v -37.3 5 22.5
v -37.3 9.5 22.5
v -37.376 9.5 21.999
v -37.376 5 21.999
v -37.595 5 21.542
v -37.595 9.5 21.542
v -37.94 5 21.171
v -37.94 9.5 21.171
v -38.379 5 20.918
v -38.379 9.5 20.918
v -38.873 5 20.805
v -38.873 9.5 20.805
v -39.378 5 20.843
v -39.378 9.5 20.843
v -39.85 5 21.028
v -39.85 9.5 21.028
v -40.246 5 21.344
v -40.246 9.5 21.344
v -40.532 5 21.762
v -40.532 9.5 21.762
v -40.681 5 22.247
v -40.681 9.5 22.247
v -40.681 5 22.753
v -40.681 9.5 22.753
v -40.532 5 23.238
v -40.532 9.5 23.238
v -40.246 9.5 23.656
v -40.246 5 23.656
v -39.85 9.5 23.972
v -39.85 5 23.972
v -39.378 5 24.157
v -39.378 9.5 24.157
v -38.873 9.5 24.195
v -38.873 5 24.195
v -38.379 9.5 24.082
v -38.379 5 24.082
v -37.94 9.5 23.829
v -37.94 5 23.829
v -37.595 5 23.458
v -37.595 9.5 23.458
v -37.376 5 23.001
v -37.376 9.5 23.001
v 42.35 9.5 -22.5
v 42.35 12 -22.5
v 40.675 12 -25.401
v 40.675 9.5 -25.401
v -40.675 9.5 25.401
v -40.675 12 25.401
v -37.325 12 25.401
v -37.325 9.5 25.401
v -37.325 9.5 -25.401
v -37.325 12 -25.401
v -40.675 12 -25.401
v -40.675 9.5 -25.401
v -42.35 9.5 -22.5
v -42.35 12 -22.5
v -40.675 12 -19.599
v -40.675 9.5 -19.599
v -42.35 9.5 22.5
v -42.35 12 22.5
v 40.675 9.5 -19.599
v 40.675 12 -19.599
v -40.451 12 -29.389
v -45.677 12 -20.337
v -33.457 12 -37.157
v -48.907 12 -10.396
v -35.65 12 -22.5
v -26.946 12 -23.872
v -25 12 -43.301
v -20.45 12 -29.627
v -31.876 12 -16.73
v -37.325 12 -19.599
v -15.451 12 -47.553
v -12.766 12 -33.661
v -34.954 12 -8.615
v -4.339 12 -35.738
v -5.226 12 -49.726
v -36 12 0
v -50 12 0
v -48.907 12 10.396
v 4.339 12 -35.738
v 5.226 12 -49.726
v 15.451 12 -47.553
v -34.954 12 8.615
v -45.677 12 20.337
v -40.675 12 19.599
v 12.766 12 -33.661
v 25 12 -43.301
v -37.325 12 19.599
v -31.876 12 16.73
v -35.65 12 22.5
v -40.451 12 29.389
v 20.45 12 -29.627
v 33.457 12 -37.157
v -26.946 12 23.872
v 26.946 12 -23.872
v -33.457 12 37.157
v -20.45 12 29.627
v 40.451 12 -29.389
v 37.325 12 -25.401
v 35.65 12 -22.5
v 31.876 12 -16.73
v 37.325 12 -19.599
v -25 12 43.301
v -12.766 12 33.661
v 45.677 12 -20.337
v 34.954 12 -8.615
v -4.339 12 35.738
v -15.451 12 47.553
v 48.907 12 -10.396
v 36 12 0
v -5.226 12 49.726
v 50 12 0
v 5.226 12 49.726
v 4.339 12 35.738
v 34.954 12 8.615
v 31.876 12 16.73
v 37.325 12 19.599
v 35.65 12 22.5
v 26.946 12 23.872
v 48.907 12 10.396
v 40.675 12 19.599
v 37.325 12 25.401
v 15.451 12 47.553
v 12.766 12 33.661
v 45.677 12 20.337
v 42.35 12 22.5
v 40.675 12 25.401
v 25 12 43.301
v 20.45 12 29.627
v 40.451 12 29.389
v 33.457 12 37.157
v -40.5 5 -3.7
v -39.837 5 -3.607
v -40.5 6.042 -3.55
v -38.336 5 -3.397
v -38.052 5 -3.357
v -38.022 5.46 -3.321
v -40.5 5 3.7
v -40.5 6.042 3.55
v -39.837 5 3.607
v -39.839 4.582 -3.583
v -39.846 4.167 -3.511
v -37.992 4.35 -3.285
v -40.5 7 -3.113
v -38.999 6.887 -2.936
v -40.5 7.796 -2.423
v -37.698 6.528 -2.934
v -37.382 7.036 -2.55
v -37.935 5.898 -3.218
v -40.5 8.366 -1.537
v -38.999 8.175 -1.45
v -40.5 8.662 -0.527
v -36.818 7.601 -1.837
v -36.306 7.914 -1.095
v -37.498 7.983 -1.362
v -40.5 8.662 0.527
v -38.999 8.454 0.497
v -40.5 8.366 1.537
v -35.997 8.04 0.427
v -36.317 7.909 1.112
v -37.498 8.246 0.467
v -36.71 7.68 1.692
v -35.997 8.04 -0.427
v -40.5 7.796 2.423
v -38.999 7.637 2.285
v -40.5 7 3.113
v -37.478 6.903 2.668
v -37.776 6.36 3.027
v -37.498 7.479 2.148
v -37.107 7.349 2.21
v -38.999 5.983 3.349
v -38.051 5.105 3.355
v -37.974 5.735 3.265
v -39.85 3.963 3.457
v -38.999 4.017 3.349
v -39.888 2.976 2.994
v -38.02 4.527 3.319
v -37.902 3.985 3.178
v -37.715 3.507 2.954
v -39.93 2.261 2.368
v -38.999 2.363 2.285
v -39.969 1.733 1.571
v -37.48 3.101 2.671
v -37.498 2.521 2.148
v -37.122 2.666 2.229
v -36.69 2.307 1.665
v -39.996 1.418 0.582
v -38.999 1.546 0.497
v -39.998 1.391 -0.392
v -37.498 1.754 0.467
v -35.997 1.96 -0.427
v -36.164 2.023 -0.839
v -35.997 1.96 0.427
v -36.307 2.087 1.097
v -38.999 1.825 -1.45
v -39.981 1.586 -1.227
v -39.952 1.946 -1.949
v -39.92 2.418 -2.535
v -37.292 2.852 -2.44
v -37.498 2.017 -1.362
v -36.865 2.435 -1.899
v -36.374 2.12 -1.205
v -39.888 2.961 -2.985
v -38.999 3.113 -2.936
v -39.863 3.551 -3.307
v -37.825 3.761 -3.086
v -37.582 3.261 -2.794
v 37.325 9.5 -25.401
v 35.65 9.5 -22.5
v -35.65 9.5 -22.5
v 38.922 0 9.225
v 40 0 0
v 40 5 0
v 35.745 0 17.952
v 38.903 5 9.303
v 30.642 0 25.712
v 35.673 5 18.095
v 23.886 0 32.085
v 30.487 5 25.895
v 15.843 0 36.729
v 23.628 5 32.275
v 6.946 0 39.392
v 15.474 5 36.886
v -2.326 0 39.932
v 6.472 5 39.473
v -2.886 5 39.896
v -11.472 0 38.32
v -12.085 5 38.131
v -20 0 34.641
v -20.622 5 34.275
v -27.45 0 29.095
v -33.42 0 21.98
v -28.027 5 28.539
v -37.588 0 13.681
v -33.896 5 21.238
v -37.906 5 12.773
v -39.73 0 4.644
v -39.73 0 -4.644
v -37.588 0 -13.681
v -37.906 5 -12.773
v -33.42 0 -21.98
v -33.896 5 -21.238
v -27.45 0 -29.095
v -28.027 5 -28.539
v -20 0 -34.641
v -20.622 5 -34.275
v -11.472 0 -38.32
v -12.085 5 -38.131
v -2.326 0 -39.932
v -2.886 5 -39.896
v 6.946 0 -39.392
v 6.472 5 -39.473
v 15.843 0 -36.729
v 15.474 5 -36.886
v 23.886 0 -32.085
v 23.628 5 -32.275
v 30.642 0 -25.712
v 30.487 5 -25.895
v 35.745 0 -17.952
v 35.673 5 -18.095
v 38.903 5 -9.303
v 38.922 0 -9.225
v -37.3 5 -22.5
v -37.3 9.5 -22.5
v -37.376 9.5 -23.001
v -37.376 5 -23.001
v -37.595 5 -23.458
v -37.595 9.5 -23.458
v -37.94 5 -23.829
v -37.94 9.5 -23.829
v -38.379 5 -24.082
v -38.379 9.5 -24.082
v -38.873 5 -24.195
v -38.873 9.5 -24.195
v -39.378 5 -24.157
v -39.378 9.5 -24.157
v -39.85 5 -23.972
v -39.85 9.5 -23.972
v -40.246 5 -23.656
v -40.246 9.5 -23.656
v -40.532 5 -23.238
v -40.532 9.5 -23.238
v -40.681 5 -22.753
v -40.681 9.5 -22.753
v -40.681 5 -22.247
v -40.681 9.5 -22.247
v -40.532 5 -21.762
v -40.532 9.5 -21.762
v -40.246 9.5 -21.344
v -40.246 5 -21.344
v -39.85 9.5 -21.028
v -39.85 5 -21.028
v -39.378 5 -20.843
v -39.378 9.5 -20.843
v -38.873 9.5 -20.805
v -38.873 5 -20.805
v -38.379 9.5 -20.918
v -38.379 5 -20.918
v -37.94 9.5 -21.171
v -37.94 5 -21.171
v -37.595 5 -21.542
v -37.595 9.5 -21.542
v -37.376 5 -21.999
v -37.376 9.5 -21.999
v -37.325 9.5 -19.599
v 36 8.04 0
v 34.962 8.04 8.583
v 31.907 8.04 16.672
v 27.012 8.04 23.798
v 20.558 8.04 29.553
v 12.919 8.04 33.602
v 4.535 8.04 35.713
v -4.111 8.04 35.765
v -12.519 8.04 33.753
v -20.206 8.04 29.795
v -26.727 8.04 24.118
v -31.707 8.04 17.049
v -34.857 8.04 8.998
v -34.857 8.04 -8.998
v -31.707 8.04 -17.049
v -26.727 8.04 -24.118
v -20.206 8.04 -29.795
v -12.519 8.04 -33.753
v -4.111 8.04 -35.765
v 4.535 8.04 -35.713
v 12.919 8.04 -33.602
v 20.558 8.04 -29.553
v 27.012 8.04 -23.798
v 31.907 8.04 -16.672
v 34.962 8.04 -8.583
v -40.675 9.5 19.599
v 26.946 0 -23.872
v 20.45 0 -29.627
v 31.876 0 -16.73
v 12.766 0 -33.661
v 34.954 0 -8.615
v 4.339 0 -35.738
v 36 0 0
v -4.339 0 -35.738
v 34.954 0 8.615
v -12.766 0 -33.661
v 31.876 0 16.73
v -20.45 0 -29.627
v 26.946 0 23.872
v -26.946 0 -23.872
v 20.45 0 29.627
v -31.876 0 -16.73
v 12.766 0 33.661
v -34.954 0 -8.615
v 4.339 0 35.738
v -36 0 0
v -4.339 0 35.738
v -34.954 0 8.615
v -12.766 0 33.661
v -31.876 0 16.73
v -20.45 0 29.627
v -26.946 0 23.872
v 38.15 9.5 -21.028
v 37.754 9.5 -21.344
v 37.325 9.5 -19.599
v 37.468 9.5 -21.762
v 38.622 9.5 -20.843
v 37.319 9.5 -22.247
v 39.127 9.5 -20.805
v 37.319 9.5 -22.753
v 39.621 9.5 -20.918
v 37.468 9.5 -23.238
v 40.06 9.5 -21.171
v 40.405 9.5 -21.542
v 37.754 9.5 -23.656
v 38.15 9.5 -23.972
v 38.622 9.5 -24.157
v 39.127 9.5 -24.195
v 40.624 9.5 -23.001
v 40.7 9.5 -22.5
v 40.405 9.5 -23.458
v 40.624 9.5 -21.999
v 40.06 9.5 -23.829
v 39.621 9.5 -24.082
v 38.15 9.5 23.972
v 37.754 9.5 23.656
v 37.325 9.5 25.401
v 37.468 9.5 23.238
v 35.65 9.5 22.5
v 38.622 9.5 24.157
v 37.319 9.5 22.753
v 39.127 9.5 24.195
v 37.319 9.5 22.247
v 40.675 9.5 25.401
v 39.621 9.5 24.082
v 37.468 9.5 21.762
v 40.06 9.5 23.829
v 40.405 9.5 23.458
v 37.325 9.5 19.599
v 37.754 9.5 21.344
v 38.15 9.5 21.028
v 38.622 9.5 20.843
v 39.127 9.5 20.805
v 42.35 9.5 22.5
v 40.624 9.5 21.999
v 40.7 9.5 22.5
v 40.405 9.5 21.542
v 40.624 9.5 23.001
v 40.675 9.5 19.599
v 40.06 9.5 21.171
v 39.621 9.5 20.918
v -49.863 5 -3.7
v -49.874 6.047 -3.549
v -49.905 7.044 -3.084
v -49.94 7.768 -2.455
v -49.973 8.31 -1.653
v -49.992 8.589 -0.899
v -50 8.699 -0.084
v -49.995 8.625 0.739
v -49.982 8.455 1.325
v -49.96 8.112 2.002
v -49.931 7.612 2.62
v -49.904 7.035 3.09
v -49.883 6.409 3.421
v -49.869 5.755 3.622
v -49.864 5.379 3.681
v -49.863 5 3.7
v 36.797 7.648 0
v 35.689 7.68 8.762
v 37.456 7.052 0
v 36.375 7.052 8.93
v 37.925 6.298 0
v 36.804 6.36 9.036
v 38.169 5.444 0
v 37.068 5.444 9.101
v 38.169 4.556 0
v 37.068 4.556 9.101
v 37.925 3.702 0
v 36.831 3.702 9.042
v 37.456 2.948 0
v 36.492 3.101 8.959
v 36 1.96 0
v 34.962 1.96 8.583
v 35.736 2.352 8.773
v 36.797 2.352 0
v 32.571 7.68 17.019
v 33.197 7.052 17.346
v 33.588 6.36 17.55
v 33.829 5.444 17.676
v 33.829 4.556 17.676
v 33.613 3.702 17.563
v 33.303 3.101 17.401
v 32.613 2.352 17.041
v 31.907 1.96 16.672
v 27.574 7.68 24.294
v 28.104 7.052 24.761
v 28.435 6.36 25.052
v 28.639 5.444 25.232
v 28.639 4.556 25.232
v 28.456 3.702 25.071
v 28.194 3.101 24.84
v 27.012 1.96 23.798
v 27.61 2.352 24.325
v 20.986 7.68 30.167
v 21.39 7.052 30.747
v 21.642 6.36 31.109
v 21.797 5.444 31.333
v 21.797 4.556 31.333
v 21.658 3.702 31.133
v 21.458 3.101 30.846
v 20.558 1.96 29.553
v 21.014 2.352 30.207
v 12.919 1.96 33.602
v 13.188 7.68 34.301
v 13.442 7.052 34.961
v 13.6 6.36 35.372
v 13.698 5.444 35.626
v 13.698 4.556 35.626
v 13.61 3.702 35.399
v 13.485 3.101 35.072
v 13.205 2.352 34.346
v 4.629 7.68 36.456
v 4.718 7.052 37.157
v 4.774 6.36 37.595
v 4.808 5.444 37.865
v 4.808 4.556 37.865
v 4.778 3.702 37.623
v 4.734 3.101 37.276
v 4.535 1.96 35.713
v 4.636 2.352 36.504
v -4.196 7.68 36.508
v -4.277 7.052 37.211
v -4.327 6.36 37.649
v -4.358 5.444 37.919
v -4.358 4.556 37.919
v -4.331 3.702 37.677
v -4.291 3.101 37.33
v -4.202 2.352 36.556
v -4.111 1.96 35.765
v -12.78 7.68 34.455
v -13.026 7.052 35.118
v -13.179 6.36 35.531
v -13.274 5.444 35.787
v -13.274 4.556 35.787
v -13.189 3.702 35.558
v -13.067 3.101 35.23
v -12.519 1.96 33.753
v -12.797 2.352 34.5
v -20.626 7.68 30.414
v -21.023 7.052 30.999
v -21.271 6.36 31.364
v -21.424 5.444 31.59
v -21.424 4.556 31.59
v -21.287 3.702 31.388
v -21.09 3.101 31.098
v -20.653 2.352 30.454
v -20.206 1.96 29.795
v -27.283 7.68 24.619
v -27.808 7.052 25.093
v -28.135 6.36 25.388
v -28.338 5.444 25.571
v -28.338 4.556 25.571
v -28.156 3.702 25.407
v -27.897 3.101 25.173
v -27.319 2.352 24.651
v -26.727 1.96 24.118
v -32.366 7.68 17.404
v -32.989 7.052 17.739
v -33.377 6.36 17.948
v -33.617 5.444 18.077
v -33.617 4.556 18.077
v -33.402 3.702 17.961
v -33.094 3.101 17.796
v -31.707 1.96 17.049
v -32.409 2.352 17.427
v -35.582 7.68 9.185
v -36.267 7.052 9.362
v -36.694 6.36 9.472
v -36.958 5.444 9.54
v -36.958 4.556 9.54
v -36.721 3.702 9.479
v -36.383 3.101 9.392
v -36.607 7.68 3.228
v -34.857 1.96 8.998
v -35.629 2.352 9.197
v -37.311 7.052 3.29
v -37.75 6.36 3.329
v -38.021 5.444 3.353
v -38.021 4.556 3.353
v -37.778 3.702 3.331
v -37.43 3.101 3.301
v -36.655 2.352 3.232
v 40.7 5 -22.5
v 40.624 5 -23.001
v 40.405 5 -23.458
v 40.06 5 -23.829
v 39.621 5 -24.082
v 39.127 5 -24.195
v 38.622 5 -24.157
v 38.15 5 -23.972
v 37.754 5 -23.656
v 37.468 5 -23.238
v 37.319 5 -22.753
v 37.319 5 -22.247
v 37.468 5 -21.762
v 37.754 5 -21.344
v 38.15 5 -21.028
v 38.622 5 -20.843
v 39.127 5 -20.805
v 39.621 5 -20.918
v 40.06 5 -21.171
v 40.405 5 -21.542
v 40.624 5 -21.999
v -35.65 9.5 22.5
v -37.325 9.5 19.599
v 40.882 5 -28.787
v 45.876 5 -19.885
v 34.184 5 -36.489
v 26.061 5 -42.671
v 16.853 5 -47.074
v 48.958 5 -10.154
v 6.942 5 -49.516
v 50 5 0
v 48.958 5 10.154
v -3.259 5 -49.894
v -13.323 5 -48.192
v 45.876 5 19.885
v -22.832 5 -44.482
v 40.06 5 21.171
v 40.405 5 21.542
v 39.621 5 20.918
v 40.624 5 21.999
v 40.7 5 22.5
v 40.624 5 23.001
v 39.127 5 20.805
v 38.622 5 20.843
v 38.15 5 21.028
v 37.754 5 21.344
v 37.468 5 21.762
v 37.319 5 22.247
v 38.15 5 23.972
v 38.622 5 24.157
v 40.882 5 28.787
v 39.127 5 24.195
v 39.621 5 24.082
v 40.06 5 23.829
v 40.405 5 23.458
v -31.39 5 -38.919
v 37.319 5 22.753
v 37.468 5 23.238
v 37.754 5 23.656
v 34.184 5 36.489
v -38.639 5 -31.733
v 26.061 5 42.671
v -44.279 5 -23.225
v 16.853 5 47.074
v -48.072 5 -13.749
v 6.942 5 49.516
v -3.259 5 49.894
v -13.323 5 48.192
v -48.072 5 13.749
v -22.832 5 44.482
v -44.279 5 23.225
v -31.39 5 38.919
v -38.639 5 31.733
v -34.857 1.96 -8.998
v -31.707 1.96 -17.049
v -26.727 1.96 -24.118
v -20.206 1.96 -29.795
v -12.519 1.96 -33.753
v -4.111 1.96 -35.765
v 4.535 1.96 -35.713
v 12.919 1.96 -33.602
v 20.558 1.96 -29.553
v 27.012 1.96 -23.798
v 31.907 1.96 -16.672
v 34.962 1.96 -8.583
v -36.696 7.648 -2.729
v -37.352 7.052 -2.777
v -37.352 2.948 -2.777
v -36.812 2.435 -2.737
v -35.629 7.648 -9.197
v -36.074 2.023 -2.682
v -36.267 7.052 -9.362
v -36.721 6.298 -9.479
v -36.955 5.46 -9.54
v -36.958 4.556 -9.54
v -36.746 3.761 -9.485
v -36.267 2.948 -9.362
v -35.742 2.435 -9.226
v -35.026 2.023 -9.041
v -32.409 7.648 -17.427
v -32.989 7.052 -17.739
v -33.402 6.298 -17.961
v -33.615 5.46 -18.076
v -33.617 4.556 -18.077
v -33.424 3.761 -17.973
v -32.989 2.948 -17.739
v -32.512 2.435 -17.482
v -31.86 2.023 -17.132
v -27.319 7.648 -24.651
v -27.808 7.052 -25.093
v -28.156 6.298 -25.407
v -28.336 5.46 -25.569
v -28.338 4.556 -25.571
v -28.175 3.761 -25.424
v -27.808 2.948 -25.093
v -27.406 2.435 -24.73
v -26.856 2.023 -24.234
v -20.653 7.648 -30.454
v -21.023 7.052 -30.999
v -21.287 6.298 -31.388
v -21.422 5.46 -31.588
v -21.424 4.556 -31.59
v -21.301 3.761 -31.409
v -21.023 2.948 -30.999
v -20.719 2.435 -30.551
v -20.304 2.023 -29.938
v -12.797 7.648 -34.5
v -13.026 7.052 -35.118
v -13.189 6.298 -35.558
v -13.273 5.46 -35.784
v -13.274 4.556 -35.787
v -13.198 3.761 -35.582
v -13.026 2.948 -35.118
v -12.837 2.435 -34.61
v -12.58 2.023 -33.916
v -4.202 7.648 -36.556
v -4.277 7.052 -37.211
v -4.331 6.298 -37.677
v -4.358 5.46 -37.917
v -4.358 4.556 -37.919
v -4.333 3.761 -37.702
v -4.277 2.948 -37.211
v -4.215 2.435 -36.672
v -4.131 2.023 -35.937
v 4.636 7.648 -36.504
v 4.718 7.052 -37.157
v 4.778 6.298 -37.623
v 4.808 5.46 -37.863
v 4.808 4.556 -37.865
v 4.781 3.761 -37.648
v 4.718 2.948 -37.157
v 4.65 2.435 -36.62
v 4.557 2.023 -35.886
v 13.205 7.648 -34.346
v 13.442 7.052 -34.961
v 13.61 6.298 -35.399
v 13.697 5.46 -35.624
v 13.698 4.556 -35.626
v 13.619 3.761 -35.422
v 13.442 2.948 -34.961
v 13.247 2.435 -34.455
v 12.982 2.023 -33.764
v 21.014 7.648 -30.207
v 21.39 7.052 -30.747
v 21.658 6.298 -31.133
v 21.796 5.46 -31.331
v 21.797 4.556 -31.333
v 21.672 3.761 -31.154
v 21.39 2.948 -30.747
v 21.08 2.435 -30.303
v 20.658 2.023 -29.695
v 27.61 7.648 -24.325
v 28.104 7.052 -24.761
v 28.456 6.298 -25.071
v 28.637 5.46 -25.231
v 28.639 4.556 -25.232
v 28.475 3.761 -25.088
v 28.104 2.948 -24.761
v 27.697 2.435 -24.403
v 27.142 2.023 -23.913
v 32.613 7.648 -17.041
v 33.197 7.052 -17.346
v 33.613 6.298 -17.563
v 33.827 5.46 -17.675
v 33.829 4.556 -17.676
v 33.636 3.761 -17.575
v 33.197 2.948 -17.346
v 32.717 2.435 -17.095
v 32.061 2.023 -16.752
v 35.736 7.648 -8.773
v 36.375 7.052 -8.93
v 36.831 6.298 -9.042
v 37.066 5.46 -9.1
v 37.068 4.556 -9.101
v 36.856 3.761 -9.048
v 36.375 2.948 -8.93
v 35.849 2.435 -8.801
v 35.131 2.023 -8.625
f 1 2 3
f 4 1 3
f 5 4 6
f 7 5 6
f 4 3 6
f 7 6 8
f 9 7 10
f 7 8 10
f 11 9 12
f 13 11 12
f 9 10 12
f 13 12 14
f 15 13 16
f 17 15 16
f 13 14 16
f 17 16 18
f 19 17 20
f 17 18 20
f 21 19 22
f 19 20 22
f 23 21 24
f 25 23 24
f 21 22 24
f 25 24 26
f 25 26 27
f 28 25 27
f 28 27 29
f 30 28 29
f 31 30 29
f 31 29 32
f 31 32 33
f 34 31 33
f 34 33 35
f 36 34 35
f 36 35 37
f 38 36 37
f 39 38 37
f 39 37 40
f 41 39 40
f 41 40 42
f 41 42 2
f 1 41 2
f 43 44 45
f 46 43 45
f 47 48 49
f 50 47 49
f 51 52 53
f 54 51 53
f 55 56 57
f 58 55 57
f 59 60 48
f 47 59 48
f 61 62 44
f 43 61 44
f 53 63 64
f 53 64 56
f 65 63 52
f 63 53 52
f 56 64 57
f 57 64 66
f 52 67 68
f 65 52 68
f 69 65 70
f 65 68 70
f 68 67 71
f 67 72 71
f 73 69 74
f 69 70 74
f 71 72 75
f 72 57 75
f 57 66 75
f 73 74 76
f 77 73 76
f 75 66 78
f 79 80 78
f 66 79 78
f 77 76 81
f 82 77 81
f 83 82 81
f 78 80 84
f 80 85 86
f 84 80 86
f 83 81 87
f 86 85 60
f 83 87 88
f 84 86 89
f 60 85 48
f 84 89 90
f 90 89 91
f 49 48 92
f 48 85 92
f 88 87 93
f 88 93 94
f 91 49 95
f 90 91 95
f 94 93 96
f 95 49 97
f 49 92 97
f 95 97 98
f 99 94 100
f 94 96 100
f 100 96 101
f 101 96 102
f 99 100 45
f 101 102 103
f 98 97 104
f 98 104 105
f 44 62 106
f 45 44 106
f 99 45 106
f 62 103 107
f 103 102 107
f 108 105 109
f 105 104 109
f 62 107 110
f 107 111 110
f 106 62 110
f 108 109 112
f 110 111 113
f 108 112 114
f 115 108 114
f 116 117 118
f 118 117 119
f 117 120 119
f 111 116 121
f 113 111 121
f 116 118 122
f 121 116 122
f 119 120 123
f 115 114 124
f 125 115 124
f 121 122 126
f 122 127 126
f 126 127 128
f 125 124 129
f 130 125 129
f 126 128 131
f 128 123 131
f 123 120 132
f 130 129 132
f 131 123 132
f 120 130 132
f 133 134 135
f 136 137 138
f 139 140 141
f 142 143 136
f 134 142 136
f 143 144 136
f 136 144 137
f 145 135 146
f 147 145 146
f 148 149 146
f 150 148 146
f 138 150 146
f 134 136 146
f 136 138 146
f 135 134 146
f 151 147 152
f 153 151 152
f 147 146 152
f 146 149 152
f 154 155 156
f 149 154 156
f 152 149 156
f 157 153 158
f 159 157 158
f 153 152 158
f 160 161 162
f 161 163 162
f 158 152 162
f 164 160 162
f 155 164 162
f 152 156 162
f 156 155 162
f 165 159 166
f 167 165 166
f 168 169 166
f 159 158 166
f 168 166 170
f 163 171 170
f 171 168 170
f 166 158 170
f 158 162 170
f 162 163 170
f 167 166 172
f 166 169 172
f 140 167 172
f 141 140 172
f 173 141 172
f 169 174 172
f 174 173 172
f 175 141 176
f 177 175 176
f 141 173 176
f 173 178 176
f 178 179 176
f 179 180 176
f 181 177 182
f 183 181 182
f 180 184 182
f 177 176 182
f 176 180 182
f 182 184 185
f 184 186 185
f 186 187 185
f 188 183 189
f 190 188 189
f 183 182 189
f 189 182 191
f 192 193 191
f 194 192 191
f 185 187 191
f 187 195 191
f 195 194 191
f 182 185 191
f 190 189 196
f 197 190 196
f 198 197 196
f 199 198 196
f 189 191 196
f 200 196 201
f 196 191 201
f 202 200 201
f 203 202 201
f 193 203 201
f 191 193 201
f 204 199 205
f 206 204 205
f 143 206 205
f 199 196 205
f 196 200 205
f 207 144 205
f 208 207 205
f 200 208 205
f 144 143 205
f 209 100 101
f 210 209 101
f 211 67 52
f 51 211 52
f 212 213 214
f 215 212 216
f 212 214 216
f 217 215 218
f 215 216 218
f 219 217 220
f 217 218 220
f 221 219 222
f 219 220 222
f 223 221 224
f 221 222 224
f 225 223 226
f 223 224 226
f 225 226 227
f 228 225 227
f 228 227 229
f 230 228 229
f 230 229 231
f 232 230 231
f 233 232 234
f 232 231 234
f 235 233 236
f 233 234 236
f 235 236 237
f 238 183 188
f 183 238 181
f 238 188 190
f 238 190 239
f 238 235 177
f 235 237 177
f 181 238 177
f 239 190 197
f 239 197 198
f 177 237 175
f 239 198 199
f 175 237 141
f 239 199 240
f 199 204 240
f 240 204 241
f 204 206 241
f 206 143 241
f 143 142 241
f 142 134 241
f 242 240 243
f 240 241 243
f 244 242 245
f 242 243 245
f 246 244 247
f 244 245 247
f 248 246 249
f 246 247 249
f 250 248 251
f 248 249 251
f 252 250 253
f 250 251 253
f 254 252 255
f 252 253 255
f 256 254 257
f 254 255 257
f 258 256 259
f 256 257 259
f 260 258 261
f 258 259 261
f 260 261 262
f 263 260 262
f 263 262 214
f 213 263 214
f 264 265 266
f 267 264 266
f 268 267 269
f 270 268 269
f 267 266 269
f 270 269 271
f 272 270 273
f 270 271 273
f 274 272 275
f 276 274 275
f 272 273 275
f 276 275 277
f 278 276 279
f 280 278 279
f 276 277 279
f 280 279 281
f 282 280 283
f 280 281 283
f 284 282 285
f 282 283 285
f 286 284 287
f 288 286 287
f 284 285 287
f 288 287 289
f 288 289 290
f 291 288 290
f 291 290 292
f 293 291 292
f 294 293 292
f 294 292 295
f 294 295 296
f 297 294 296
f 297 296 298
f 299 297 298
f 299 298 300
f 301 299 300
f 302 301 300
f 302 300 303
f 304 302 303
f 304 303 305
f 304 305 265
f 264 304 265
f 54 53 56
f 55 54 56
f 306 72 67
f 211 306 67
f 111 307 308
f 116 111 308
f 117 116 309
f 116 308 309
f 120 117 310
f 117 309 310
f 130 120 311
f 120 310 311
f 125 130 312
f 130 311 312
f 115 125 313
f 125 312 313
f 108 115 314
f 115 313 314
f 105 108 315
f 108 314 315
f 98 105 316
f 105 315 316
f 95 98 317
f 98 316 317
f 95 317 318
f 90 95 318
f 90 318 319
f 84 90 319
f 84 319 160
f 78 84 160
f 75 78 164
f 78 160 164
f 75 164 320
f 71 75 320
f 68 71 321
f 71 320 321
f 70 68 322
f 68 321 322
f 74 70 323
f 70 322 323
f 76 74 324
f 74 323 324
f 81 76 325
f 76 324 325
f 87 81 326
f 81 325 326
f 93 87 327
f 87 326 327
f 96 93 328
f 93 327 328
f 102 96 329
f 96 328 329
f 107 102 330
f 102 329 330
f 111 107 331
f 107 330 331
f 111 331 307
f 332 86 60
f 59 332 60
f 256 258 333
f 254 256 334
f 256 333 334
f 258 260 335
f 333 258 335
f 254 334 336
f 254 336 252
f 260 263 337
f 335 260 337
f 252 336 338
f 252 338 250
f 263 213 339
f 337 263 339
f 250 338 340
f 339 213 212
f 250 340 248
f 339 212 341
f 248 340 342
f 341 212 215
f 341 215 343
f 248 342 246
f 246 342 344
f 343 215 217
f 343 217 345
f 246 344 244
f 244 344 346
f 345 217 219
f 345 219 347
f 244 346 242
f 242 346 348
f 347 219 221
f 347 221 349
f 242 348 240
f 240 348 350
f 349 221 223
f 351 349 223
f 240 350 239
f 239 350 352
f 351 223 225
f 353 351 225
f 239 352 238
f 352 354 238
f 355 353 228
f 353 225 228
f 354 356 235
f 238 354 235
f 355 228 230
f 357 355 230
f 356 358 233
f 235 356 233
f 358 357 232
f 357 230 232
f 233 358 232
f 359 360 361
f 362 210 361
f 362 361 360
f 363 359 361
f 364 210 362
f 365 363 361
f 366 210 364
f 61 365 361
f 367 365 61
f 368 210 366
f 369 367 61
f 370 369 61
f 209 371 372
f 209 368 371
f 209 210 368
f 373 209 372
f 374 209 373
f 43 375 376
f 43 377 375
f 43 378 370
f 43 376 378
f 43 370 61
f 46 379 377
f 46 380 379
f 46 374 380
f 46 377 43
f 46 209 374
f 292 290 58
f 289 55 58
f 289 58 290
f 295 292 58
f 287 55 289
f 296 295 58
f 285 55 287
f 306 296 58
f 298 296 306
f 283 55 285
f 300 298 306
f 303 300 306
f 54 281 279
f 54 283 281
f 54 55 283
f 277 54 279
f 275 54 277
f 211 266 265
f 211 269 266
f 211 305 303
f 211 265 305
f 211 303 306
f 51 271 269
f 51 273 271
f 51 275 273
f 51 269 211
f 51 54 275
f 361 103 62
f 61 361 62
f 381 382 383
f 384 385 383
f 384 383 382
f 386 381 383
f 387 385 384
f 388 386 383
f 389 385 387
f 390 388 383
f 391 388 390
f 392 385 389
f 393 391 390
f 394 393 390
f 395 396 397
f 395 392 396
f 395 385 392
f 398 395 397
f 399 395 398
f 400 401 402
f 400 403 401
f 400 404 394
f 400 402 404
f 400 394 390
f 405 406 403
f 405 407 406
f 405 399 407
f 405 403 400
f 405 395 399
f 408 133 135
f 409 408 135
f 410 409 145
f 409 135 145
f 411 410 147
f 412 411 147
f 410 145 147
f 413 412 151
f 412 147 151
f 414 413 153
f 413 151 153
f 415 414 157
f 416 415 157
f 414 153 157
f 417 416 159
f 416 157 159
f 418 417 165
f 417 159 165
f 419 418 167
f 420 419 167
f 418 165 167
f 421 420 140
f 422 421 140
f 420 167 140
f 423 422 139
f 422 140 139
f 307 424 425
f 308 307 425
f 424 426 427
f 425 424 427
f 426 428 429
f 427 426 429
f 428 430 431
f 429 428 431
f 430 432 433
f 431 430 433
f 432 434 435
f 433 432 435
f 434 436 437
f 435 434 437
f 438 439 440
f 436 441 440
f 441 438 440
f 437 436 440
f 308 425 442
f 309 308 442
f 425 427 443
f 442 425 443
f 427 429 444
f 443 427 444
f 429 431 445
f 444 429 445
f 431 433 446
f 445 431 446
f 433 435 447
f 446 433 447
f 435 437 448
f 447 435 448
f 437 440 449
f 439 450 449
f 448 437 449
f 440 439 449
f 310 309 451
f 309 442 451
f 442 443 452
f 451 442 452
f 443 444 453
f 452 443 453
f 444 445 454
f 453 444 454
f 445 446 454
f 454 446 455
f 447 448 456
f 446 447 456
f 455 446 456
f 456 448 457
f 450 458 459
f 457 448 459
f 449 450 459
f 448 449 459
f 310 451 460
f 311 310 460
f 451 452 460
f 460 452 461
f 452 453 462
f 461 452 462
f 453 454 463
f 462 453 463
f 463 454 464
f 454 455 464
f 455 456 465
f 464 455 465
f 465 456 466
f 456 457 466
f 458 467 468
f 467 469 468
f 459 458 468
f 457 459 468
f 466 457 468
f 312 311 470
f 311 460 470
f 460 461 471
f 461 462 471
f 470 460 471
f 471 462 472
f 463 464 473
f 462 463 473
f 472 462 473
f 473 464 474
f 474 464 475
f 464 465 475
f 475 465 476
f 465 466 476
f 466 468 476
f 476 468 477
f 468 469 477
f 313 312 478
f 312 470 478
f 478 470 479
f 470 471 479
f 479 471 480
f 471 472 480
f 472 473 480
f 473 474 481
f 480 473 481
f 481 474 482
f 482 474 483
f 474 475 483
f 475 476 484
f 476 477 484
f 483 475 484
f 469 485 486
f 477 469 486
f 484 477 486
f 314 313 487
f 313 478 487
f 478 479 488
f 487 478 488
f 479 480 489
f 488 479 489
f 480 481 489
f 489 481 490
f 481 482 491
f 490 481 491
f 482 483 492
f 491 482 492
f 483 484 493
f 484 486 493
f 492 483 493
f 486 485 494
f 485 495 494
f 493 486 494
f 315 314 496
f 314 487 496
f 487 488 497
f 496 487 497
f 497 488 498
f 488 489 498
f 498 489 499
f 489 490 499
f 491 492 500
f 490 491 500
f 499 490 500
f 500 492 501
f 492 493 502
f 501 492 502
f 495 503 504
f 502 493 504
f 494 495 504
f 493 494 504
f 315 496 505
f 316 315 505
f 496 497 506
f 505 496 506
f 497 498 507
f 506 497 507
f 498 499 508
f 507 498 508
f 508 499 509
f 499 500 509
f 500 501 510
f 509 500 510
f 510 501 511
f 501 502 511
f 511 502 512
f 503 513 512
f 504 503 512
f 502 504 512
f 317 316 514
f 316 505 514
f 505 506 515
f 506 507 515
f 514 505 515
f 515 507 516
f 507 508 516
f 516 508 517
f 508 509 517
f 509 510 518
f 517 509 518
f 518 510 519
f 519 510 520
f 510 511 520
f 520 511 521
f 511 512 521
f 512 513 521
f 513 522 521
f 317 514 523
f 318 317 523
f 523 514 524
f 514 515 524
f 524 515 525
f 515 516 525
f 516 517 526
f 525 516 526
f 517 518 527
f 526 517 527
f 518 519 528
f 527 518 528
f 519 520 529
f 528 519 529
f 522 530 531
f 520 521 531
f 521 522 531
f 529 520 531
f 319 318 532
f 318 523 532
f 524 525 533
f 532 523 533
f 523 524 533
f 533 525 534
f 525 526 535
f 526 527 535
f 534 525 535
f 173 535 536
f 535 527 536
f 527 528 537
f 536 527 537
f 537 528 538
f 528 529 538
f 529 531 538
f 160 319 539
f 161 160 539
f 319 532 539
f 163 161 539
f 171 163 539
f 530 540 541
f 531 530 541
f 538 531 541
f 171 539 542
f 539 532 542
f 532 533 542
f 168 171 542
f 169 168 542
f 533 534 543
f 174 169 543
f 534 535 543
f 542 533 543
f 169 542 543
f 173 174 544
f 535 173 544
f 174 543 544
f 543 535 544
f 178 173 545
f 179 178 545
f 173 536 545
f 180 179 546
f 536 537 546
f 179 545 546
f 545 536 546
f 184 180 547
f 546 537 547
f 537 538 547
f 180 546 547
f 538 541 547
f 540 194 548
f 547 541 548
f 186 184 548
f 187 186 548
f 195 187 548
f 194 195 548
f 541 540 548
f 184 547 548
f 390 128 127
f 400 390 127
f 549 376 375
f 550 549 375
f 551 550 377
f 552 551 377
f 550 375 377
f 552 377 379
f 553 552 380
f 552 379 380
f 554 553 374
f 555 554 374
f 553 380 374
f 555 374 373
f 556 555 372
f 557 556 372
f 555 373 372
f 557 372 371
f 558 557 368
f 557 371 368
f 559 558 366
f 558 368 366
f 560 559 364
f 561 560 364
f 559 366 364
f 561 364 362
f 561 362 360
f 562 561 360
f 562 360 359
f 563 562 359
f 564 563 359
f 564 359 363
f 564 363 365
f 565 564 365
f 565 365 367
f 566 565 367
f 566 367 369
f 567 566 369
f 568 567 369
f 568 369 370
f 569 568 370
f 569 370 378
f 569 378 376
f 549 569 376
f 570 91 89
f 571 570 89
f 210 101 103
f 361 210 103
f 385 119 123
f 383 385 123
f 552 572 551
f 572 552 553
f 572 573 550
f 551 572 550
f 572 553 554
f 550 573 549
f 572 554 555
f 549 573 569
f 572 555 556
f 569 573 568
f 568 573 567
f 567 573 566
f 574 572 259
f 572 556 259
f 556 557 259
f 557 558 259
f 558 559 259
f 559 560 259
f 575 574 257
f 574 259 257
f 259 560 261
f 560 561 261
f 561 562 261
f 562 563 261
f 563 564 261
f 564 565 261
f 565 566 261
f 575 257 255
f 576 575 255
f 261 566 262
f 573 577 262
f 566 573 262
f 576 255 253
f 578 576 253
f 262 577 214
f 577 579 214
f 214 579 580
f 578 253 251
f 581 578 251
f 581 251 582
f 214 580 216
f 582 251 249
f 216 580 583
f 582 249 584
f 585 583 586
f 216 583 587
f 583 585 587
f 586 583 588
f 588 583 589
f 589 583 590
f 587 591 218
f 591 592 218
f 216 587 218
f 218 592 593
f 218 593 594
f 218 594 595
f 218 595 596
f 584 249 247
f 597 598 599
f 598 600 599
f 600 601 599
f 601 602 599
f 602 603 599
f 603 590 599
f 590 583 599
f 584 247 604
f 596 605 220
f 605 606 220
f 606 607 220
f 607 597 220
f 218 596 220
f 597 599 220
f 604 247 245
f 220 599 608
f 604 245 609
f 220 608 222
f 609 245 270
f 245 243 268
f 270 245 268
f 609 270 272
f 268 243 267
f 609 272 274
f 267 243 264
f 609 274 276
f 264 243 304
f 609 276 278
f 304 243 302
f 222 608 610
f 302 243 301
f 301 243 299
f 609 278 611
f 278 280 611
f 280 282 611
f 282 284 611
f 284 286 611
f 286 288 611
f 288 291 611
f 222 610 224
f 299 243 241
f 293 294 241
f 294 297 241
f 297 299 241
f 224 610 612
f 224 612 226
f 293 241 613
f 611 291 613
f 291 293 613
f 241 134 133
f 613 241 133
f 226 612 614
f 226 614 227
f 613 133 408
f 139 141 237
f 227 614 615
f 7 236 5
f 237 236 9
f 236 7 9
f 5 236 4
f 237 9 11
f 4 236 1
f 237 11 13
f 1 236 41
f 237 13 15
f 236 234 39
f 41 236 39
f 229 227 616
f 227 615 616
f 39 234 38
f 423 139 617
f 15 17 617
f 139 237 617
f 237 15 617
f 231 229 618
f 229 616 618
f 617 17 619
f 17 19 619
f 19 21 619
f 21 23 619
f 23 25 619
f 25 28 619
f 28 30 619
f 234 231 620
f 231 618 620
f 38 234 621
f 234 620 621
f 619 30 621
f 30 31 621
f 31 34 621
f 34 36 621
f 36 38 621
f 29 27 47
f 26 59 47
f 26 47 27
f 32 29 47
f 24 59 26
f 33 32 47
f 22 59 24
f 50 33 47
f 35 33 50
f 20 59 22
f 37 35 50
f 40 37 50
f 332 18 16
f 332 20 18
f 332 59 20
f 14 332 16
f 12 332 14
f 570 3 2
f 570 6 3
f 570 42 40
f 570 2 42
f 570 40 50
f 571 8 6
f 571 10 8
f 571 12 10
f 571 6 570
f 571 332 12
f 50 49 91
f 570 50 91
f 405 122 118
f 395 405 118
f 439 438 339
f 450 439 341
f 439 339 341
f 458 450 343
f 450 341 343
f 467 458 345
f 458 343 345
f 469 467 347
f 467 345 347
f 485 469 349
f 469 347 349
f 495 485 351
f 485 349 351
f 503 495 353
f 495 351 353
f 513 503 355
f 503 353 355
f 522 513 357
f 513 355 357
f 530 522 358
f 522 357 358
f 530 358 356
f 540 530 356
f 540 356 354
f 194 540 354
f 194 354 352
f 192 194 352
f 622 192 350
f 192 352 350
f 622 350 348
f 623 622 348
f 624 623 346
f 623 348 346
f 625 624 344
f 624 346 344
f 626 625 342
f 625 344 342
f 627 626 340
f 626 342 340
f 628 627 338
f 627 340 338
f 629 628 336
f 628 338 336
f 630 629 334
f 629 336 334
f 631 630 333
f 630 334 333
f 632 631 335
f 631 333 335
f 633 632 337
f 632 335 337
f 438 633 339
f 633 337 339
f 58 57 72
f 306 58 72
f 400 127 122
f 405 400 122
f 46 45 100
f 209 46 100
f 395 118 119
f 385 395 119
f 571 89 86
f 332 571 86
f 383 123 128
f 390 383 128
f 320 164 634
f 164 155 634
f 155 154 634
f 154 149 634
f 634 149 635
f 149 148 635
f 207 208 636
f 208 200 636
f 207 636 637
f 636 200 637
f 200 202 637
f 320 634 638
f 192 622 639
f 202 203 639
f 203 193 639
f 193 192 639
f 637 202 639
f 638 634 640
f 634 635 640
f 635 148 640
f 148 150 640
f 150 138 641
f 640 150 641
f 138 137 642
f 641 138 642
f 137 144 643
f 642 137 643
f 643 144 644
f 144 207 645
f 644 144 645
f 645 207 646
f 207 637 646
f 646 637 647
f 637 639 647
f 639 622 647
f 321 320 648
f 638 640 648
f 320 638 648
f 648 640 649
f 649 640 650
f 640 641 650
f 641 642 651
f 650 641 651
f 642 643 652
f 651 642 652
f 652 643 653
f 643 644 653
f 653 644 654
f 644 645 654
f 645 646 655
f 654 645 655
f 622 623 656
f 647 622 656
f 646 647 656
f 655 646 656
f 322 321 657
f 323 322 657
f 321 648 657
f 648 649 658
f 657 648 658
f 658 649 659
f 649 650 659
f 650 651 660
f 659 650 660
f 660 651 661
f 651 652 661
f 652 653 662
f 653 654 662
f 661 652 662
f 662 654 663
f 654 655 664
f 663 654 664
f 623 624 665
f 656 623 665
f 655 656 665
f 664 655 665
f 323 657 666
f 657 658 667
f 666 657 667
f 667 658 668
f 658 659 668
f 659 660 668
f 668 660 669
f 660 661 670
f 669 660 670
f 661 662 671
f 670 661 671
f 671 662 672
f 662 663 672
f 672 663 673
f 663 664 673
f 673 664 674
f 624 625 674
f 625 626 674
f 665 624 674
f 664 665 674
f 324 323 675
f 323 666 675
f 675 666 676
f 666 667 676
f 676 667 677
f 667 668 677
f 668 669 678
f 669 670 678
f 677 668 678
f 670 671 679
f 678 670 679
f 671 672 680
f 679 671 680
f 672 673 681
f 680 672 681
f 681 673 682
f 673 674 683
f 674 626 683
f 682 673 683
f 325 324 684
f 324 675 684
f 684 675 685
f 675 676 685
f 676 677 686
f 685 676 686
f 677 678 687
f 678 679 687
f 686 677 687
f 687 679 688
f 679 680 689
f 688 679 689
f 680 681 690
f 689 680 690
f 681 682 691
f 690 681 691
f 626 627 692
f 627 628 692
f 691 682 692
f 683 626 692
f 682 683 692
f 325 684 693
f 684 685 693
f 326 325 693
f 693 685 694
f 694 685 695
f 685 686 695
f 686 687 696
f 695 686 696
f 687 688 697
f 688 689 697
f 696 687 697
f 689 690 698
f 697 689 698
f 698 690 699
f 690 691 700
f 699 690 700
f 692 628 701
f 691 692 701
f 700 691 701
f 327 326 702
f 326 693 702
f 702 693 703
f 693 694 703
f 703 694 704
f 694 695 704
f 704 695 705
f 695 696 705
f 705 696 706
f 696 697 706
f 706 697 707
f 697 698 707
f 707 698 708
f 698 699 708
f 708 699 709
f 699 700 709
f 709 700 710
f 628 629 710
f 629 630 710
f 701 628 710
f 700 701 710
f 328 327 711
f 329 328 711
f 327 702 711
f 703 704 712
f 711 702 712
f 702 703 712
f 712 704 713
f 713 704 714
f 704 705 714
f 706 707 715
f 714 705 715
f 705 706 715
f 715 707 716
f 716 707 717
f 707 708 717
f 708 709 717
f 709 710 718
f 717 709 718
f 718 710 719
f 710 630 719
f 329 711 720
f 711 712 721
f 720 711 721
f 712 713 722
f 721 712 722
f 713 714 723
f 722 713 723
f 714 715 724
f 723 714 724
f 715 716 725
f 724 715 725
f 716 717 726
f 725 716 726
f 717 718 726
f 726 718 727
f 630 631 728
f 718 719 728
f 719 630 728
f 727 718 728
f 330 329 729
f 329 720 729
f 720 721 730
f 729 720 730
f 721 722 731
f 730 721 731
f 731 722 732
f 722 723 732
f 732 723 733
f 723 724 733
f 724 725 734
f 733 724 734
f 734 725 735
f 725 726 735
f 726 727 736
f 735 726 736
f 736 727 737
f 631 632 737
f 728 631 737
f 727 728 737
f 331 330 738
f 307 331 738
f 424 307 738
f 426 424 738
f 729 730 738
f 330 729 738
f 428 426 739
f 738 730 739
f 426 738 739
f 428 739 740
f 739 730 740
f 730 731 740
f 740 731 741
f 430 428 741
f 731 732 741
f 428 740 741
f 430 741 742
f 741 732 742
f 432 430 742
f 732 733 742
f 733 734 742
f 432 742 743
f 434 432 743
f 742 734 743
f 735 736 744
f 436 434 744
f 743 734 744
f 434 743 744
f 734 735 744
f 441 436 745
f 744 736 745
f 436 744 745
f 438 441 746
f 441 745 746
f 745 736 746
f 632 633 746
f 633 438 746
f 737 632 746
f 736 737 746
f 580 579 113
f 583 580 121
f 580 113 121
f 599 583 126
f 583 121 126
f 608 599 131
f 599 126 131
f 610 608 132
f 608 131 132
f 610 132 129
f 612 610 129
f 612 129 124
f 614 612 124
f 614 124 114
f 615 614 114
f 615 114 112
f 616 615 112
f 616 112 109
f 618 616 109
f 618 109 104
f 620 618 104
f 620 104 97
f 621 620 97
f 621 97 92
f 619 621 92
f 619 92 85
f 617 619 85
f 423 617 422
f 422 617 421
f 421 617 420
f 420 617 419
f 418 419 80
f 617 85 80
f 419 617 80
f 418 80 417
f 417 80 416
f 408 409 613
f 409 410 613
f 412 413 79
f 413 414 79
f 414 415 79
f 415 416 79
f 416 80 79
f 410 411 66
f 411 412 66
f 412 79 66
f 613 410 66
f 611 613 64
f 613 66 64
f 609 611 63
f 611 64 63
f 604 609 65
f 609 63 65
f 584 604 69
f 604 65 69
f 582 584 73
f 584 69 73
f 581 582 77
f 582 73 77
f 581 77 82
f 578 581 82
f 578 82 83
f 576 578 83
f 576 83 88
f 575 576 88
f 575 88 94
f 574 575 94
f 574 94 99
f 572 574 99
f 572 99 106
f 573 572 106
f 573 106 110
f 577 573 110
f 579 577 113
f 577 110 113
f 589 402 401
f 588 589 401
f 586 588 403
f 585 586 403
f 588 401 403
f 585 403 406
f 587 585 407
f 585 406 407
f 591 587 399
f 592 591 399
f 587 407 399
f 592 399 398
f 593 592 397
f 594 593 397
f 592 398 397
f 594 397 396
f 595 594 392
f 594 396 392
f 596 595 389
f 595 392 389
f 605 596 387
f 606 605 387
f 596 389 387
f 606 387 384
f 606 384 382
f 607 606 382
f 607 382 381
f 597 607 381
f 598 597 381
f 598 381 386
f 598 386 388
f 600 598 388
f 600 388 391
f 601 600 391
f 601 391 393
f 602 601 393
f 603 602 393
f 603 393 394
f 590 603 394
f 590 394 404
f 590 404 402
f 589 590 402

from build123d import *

# Parameters (mm, degrees)
CROQUIS4_R            = 1.7
CORTAR_EXTRUIR1_DEPTH = 10
CORTAR_EXTRUIR2_DEPTH = 2.5


with BuildPart() as part:
    # Croquis1 → Revolución1 (revolve)
    with BuildSketch(Plane.XY):
        with BuildLine():
            Line((50, 12), (36, 12))
            Line((36, 12), (36, 8.039736831))
            ThreePointArc((36, 8.039736831), (38.2, 5), (36, 1.960263169))
            Line((36, 1.960263169), (36, 0))
            Line((36, 0), (40, 0))
            Line((40, 0), (40, 5))
            Line((40, 5), (50, 5))
            Line((50, 5), (50, 12))
        make_face()
    revolve(axis=Axis((0, 9.671658493, 0), (0, -1, 0)))

    # Croquis2 → Cortar-Revolución1 (revolve, cut)
    with BuildSketch(Plane(origin=(0, 5, 0), x_dir=(1, 0, 0), z_dir=(0, 1, 0))):
        Polygon((-35.5, 0), (-51.5, 0), (-51.5, 3.7), (-40.5, 3.7), (-35.5, 3), align=None)
    revolve(axis=Axis((-54.955446394, 5, 0), (1, 0, 0)), mode=Mode.SUBTRACT)

    # Croquis4 → Cortar-Extruir1 (cut)
    with BuildSketch(Plane(origin=(0, 12, 0), x_dir=(1, 0, 0), z_dir=(0, 1, 0))):
        with Locations((-39, 22.5)):
            Circle(CROQUIS4_R)
        with Locations((39, 22.5)):
            Circle(CROQUIS4_R)
        with Locations((39, -22.5)):
            Circle(CROQUIS4_R)
        with Locations((-39, -22.5)):
            Circle(CROQUIS4_R)
    extrude(amount=-CORTAR_EXTRUIR1_DEPTH, mode=Mode.SUBTRACT)

    # Croquis5 → Cortar-Extruir2 (cut)
    with BuildSketch(Plane(origin=(0, 12, 0), x_dir=(1, 0, 0), z_dir=(0, 1, 0))):
        Polygon((-42.35, 22.5), (-40.675, 19.598814897), (-37.325, 19.598814897), (-35.65, 22.5), (-37.325, 25.401185103), (-40.675, 25.401185103), align=None)
        Polygon((-42.35, -22.5), (-40.675, -25.401185103), (-37.325, -25.401185103), (-35.65, -22.5), (-37.325, -19.598814897), (-40.675, -19.598814897), align=None)
        Polygon((35.65, 22.5), (37.325, 19.598814897), (40.675, 19.598814897), (42.35, 22.5), (40.675, 25.401185103), (37.325, 25.401185103), align=None)
        Polygon((35.65, -22.5), (37.325, -25.401185103), (40.675, -25.401185103), (42.35, -22.5), (40.675, -19.598814897), (37.325, -19.598814897), align=None)
    extrude(amount=-CORTAR_EXTRUIR2_DEPTH, mode=Mode.SUBTRACT)


solid = part.part
